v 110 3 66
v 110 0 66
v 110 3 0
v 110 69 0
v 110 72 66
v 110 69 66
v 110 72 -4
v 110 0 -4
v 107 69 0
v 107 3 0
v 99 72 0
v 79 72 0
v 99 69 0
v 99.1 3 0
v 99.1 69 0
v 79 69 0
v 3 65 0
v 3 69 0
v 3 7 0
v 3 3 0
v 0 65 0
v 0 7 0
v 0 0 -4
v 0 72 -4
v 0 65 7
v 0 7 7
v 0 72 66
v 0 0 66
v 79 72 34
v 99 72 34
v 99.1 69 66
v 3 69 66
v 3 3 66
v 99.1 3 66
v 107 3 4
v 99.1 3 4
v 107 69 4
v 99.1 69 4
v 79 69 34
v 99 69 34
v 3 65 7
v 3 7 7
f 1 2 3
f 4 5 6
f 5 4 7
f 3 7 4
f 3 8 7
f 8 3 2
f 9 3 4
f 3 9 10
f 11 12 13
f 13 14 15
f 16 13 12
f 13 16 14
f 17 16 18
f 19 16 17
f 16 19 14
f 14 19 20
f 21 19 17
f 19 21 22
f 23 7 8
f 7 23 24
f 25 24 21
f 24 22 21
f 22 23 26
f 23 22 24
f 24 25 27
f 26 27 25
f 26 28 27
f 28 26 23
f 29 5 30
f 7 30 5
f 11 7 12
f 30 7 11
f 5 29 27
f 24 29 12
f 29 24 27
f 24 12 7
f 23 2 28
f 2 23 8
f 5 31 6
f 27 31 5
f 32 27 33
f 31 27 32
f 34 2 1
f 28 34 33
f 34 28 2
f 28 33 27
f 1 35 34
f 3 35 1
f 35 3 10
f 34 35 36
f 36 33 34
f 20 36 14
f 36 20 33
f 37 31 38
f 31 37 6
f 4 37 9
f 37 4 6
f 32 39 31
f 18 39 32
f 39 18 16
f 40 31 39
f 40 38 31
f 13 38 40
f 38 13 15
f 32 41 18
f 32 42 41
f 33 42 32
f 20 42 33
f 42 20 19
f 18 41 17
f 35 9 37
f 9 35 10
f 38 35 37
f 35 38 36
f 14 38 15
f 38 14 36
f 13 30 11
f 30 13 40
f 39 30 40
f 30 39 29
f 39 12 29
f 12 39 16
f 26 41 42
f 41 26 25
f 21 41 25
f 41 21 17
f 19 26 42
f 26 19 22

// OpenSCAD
// Dock Auto-Empty Fan ENVELOPE BOX (Jig 19A)
// ===========================================================================
// Envelope-fit check for the BOM "Auto-empty suction fan" (Dock table) class
// draft `dock-auto-empty-fan/dock-auto-empty-fan.scad`. Confirms the actual
// sourced fan's body OD and length fit the assumed 65mm-class footprint.
//
// Keep these parameter VALUES in sync with dock-auto-empty-fan.scad (all
// provenance lives there + MEASURE-ME.md §20). Do NOT hand-edit only one file.
// Tune `env_clearance`, never the part.
//
// Pass/fail + fail->fix mapping: PRINT-TEST.md Jig 19 Part A.
// License: CC BY-SA 4.0

$fn = 48;

/* [Fan params — mirror dock-auto-empty-fan.scad] */
can_diam       = 65; // mm (BOM "65mm") — unmeasured by hand
can_len        = 95; // mm (estimate)
inlet_od       = 58; // mm (estimate) inlet boss OD
inlet_h        = 6;  // mm (estimate) inlet boss height
outlet_w       = 42; // mm (estimate) outlet duct inner width
outlet_h       = 28; // mm (estimate) outlet duct inner height
outlet_len     = 25; // mm (estimate) outlet duct protrusion

/* [Jig dimensions - EDIT] */
// Diametral/axial clearance around the fan in the envelope box (mm).
// Start 1.0: tight -> 0.5, loose -> 2.0 (see Jig 19A FAIL->FIX).
env_clearance   = 1.0; // mm (estimate)
wall_t          = 3.0; // mm jig wall thickness
base_t          = 4.0; // mm jig base thickness
lip             = 8.0; // mm end-cap lip height so the fan can't slide through

// ===== GEOMETRY (box opens on +X; fan slides in along +X) =====
box_w = can_diam + env_clearance;     // inner width (Y)
box_h = can_diam + env_clearance;     // inner height (Z)
box_l = can_len + env_clearance;      // inner length (X), body only

module envelope_box() {
    difference() {
        // Outer shell (closed bottom, both side walls, closed back at -X,
        // open front at +X, plus a low front lip so the fan stops in place)
        translate([0, 0, -base_t]) {
            // floor
            cube([box_l + 2 * wall_t + lip, box_w + 2 * wall_t, base_t]);
            // left wall (Y min)
            translate([0, 0, 0]) cube([box_l + 2 * wall_t + lip, wall_t, box_h + base_t]);
            // right wall (Y max)
            translate([0, box_w + wall_t, 0]) cube([box_l + 2 * wall_t + lip, wall_t, box_h + base_t]);
            // back wall (X min)
            translate([0, 0, 0]) cube([wall_t, box_w + 2 * wall_t, box_h + base_t]);
            // front low lip (holds the fan in, still lets it pass)
            translate([box_l + wall_t, 0, 0]) cube([lip, box_w + 2 * wall_t, lip]);
        }
        // Interior pocket (clearance volume from the fan)
        translate([wall_t, wall_t, 0])
            cube([box_l + 0.1, box_w, box_h]);
        // Outlet-duct notch on the +Y side so a tangential outlet clears
        translate([wall_t + box_l - 20, box_w + wall_t - 0.5, 0])
            cube([20, outlet_len + 1, outlet_h + 2 * wall_t]);
        // Inlet-boss notch on the rear(-X) wall so the boss is not the stop
        translate([0, wall_t + (box_w - inlet_od) / 2, 0])
            cube([wall_t + 1, inlet_od, inlet_h + 1]);
    }
}

envelope_box();
